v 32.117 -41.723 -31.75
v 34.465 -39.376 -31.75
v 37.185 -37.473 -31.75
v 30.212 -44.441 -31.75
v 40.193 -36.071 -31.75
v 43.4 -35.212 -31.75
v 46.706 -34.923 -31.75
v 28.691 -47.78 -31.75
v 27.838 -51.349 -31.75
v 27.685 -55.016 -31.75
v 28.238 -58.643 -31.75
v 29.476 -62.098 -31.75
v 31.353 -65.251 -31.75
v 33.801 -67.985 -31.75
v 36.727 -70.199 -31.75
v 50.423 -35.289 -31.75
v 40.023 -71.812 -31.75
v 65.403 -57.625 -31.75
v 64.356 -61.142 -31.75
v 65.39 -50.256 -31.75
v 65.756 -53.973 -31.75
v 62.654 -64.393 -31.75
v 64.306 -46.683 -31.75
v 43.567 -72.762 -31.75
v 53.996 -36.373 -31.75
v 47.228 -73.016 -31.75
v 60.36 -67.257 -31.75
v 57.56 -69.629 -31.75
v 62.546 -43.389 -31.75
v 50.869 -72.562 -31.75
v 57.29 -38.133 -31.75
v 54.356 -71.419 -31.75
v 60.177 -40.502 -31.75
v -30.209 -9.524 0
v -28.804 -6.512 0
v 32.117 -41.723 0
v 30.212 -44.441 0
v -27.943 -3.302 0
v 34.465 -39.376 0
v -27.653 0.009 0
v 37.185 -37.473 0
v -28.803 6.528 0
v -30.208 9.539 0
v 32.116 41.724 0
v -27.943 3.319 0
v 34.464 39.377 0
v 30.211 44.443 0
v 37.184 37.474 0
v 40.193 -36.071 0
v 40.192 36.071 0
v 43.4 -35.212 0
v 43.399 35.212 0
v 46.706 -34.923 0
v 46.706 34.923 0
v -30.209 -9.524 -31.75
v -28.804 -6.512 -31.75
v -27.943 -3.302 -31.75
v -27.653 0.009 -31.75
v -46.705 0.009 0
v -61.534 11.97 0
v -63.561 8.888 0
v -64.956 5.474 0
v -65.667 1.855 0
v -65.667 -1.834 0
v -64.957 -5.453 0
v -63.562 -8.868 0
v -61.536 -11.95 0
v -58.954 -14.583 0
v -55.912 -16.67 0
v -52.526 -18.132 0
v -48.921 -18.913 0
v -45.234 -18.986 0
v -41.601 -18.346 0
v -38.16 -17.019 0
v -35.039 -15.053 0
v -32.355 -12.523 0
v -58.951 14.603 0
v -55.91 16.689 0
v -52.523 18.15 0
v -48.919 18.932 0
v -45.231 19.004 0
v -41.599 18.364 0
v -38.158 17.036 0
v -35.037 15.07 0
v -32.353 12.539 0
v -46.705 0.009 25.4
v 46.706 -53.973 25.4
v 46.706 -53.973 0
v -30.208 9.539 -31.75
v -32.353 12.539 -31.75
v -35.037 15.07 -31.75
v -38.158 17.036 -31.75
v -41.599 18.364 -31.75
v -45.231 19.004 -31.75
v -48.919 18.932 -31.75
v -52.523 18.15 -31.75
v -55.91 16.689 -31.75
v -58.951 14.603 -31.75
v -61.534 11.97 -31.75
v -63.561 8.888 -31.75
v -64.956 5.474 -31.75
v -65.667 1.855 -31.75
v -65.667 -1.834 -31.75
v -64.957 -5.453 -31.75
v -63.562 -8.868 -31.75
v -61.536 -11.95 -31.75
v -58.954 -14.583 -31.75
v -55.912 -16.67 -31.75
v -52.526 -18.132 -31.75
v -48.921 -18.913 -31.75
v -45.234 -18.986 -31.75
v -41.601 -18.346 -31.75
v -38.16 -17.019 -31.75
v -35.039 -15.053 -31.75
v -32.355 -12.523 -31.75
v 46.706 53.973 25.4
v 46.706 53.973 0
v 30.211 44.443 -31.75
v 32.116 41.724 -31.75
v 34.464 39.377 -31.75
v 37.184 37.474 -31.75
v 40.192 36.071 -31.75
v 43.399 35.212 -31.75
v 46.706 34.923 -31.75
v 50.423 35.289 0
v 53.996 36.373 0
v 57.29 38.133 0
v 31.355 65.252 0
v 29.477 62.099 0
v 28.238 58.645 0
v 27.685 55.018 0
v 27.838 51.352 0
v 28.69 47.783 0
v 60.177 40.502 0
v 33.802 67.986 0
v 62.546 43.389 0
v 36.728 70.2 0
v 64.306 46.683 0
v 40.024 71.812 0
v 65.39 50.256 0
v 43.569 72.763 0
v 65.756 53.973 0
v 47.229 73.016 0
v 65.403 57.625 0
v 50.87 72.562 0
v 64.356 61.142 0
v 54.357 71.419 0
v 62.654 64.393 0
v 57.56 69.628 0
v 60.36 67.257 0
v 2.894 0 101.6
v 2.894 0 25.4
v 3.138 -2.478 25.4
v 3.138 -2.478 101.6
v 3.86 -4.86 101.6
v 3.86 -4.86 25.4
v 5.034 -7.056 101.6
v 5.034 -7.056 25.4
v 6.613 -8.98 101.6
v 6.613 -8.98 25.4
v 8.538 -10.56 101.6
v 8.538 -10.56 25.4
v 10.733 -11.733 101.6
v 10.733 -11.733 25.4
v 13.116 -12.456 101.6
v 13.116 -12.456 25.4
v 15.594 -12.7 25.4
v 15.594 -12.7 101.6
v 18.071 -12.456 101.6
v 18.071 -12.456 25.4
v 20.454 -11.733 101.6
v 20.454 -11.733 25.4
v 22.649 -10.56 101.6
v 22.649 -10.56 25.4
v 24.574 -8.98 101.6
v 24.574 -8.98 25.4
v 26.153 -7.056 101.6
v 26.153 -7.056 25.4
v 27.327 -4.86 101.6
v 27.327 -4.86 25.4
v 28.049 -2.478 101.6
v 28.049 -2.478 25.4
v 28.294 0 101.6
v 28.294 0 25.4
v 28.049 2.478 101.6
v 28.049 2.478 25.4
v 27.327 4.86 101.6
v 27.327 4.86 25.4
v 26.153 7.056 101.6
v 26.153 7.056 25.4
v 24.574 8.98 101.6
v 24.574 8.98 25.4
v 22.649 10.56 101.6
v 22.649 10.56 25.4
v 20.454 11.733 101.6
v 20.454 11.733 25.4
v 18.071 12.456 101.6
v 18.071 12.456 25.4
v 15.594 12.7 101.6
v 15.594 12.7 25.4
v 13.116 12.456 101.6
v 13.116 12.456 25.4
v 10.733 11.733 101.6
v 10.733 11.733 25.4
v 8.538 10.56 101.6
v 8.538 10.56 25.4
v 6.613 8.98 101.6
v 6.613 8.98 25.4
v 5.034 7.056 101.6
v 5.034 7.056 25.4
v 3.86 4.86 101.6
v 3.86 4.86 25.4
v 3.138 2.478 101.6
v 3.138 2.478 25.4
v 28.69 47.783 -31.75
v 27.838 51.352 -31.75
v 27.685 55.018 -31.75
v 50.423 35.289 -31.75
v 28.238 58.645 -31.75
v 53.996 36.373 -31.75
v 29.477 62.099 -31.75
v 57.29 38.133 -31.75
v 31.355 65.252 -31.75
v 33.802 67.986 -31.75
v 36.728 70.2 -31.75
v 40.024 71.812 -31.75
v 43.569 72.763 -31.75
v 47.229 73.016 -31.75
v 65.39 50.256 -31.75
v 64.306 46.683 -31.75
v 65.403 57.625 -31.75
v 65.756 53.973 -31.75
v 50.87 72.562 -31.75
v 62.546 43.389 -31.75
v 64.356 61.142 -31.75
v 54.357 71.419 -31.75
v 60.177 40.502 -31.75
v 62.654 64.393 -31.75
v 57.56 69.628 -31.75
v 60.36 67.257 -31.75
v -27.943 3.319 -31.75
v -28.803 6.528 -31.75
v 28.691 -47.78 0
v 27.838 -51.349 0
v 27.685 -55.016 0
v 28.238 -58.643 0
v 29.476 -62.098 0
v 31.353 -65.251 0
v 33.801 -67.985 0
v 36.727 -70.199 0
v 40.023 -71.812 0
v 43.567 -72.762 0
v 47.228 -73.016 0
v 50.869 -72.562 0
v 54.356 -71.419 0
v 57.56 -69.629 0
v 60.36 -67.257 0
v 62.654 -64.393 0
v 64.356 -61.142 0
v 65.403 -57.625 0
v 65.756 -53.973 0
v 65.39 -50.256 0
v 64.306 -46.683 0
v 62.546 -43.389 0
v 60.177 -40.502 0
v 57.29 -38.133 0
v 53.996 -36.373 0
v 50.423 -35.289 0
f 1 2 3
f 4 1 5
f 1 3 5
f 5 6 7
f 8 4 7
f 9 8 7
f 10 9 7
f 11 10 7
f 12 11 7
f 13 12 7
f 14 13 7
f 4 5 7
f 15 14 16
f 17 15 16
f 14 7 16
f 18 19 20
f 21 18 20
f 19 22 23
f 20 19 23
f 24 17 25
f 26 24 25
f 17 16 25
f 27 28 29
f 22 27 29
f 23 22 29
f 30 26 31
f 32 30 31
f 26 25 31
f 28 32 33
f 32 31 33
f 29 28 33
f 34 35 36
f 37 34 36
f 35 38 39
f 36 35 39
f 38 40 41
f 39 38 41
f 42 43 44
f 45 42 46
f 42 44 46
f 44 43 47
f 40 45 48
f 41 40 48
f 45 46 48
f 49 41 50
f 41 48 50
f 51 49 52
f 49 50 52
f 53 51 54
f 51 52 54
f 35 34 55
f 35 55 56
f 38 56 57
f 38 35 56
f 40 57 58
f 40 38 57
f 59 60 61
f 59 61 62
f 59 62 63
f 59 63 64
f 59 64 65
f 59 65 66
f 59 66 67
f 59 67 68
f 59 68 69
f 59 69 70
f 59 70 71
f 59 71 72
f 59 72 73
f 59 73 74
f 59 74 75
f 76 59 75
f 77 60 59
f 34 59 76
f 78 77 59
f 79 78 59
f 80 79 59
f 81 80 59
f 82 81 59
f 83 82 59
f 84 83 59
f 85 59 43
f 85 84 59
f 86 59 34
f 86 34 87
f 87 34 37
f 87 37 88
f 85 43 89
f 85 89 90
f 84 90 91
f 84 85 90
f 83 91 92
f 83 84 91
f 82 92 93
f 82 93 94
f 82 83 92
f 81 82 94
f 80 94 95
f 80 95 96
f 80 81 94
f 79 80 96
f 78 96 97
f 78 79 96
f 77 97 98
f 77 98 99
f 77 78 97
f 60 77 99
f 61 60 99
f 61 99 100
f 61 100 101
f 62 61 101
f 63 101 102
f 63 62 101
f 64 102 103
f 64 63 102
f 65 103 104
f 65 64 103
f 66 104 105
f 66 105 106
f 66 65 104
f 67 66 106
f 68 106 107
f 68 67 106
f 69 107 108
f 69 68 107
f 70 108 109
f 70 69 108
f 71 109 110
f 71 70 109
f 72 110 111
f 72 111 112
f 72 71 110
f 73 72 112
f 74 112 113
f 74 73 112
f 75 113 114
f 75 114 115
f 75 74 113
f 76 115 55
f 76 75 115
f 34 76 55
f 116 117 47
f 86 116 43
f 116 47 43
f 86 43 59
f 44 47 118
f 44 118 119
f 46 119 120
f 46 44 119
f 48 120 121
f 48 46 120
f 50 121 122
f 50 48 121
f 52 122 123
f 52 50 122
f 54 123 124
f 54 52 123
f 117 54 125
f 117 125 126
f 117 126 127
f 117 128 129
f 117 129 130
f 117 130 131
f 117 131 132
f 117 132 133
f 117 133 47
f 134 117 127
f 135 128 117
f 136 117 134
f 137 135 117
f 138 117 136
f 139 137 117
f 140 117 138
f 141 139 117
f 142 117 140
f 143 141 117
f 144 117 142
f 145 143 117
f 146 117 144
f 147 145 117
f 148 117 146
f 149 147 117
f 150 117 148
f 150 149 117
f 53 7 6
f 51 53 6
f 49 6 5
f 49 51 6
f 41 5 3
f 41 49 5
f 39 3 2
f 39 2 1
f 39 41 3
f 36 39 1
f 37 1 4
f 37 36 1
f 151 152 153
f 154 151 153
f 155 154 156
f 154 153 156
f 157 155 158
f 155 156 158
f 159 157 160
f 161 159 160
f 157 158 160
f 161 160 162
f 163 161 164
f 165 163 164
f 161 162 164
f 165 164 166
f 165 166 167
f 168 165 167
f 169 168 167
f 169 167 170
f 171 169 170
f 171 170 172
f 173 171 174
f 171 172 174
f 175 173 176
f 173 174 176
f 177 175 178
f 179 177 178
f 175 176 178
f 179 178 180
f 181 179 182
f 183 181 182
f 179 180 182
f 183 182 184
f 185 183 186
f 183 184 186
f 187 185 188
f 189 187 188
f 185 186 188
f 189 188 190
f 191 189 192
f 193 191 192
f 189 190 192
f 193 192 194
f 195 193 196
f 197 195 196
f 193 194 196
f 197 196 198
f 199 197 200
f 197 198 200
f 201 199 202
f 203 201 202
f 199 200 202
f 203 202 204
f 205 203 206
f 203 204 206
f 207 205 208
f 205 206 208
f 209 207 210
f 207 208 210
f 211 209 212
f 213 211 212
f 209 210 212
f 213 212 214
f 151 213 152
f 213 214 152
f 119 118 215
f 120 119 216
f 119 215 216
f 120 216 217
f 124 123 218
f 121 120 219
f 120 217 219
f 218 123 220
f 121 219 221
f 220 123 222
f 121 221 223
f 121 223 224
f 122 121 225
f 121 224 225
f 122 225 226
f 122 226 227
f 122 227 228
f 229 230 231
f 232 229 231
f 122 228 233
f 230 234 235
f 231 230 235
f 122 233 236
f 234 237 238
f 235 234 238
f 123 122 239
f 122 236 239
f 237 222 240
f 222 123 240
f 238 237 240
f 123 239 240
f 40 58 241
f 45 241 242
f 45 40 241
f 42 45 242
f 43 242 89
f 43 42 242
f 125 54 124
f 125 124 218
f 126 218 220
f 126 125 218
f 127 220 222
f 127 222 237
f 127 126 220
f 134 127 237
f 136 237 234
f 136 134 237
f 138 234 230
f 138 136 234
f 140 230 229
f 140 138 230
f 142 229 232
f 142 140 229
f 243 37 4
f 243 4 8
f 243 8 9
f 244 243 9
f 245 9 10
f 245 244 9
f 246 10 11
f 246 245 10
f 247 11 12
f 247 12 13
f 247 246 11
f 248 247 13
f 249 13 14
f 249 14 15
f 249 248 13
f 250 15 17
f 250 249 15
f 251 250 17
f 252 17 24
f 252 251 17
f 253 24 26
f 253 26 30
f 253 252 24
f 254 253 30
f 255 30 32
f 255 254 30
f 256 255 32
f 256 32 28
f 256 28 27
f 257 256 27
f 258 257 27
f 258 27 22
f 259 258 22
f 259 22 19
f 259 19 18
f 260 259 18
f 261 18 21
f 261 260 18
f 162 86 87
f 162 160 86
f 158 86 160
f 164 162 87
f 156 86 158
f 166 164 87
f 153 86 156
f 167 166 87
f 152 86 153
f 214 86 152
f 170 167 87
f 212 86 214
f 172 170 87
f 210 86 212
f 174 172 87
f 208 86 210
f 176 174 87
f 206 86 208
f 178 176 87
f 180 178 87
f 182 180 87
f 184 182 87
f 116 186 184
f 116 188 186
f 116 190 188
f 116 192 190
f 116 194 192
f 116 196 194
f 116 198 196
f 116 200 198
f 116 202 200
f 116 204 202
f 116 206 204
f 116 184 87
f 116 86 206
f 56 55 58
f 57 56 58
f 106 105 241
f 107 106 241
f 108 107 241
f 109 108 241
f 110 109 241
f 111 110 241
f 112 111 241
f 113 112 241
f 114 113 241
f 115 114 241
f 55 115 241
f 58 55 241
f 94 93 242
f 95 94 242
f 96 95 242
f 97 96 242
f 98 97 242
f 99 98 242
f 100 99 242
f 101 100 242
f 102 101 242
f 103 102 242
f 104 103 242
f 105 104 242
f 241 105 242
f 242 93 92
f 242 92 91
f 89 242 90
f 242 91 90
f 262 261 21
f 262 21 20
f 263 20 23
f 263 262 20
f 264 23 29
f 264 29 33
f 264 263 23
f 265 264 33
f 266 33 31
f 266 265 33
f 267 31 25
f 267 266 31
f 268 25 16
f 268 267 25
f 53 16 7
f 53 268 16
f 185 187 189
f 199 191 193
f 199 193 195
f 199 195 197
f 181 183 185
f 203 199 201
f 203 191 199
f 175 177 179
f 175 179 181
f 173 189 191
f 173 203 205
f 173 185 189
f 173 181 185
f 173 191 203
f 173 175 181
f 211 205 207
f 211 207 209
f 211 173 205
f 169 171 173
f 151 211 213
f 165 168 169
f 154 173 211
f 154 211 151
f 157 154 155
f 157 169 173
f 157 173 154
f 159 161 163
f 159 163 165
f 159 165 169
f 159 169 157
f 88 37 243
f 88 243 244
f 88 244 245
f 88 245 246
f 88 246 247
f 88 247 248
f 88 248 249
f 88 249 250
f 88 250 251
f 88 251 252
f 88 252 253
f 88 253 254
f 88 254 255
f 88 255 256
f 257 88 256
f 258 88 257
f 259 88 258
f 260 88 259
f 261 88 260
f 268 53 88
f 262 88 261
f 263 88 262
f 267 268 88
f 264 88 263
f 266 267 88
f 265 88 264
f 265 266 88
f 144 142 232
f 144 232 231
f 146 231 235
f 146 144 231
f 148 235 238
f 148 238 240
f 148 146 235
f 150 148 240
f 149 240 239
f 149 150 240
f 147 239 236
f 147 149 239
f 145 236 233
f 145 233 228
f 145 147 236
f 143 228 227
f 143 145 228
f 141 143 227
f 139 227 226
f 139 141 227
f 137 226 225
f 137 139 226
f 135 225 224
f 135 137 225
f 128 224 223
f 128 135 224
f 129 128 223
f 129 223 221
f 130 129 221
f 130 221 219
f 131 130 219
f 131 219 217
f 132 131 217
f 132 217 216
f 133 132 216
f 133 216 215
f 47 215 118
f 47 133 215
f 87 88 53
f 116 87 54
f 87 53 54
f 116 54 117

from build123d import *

# Parameters (mm, degrees)
SKETCH1_R             = 19.051661899
BOSS_EXTRUDE3_DEPTH   = 31.75
SKETCH1_R_2           = 19.05
BOSS_EXTRUDE3_2_DEPTH = 31.75
BOSS_EXTRUDE3_3_DEPTH = 31.75
BOSS_EXTRUDE4_DEPTH   = 25.4
SKETCH3_R             = 12.7
BOSS_EXTRUDE5_DEPTH   = 76.2


with BuildPart() as part:
    # Sketch1 → Boss-Extrude3 (new body)
    with BuildSketch(Plane.XY):
        with Locations((-46.704713672, 0.008989394)):
            Circle(SKETCH1_R)
    extrude(amount=-BOSS_EXTRUDE3_DEPTH)



with BuildPart() as body_2:
    # Sketch1 → Boss-Extrude3 2 (new body)
    with BuildSketch(Plane.XY):
        with Locations((46.706375572, -53.972753345)):
            Circle(SKETCH1_R_2)
    extrude(amount=-BOSS_EXTRUDE3_2_DEPTH)


with BuildPart() as body_3:
    # Sketch1 → Boss-Extrude3 3 (new body)
    with BuildSketch(Plane.XY):
        with Locations((46.706375572, 53.972753345)):
            Circle(SKETCH1_R_2)
    extrude(amount=-BOSS_EXTRUDE3_3_DEPTH)


with BuildPart() as part_1:
    add(part.part)

    add(body_2.part)  # Boss-Extrude4 merges body 2

    add(body_3.part)  # Boss-Extrude4 merges body 3
    # Sketch1<6> → Boss-Extrude4 (add)
    with BuildSketch(Plane.XY):
        Polygon((-46.704713672, 0.008989394), (46.706375572, -53.972753345), (46.706375572, 53.972753345), align=None)
    extrude(amount=BOSS_EXTRUDE4_DEPTH)

    # Sketch3 → Boss-Extrude5 (add)
    with BuildSketch(Plane.XY.offset(25.4)):
        with Locations((15.593508684, 0)):
            Circle(SKETCH3_R)
    extrude(amount=BOSS_EXTRUDE5_DEPTH)


solid = part_1.part
